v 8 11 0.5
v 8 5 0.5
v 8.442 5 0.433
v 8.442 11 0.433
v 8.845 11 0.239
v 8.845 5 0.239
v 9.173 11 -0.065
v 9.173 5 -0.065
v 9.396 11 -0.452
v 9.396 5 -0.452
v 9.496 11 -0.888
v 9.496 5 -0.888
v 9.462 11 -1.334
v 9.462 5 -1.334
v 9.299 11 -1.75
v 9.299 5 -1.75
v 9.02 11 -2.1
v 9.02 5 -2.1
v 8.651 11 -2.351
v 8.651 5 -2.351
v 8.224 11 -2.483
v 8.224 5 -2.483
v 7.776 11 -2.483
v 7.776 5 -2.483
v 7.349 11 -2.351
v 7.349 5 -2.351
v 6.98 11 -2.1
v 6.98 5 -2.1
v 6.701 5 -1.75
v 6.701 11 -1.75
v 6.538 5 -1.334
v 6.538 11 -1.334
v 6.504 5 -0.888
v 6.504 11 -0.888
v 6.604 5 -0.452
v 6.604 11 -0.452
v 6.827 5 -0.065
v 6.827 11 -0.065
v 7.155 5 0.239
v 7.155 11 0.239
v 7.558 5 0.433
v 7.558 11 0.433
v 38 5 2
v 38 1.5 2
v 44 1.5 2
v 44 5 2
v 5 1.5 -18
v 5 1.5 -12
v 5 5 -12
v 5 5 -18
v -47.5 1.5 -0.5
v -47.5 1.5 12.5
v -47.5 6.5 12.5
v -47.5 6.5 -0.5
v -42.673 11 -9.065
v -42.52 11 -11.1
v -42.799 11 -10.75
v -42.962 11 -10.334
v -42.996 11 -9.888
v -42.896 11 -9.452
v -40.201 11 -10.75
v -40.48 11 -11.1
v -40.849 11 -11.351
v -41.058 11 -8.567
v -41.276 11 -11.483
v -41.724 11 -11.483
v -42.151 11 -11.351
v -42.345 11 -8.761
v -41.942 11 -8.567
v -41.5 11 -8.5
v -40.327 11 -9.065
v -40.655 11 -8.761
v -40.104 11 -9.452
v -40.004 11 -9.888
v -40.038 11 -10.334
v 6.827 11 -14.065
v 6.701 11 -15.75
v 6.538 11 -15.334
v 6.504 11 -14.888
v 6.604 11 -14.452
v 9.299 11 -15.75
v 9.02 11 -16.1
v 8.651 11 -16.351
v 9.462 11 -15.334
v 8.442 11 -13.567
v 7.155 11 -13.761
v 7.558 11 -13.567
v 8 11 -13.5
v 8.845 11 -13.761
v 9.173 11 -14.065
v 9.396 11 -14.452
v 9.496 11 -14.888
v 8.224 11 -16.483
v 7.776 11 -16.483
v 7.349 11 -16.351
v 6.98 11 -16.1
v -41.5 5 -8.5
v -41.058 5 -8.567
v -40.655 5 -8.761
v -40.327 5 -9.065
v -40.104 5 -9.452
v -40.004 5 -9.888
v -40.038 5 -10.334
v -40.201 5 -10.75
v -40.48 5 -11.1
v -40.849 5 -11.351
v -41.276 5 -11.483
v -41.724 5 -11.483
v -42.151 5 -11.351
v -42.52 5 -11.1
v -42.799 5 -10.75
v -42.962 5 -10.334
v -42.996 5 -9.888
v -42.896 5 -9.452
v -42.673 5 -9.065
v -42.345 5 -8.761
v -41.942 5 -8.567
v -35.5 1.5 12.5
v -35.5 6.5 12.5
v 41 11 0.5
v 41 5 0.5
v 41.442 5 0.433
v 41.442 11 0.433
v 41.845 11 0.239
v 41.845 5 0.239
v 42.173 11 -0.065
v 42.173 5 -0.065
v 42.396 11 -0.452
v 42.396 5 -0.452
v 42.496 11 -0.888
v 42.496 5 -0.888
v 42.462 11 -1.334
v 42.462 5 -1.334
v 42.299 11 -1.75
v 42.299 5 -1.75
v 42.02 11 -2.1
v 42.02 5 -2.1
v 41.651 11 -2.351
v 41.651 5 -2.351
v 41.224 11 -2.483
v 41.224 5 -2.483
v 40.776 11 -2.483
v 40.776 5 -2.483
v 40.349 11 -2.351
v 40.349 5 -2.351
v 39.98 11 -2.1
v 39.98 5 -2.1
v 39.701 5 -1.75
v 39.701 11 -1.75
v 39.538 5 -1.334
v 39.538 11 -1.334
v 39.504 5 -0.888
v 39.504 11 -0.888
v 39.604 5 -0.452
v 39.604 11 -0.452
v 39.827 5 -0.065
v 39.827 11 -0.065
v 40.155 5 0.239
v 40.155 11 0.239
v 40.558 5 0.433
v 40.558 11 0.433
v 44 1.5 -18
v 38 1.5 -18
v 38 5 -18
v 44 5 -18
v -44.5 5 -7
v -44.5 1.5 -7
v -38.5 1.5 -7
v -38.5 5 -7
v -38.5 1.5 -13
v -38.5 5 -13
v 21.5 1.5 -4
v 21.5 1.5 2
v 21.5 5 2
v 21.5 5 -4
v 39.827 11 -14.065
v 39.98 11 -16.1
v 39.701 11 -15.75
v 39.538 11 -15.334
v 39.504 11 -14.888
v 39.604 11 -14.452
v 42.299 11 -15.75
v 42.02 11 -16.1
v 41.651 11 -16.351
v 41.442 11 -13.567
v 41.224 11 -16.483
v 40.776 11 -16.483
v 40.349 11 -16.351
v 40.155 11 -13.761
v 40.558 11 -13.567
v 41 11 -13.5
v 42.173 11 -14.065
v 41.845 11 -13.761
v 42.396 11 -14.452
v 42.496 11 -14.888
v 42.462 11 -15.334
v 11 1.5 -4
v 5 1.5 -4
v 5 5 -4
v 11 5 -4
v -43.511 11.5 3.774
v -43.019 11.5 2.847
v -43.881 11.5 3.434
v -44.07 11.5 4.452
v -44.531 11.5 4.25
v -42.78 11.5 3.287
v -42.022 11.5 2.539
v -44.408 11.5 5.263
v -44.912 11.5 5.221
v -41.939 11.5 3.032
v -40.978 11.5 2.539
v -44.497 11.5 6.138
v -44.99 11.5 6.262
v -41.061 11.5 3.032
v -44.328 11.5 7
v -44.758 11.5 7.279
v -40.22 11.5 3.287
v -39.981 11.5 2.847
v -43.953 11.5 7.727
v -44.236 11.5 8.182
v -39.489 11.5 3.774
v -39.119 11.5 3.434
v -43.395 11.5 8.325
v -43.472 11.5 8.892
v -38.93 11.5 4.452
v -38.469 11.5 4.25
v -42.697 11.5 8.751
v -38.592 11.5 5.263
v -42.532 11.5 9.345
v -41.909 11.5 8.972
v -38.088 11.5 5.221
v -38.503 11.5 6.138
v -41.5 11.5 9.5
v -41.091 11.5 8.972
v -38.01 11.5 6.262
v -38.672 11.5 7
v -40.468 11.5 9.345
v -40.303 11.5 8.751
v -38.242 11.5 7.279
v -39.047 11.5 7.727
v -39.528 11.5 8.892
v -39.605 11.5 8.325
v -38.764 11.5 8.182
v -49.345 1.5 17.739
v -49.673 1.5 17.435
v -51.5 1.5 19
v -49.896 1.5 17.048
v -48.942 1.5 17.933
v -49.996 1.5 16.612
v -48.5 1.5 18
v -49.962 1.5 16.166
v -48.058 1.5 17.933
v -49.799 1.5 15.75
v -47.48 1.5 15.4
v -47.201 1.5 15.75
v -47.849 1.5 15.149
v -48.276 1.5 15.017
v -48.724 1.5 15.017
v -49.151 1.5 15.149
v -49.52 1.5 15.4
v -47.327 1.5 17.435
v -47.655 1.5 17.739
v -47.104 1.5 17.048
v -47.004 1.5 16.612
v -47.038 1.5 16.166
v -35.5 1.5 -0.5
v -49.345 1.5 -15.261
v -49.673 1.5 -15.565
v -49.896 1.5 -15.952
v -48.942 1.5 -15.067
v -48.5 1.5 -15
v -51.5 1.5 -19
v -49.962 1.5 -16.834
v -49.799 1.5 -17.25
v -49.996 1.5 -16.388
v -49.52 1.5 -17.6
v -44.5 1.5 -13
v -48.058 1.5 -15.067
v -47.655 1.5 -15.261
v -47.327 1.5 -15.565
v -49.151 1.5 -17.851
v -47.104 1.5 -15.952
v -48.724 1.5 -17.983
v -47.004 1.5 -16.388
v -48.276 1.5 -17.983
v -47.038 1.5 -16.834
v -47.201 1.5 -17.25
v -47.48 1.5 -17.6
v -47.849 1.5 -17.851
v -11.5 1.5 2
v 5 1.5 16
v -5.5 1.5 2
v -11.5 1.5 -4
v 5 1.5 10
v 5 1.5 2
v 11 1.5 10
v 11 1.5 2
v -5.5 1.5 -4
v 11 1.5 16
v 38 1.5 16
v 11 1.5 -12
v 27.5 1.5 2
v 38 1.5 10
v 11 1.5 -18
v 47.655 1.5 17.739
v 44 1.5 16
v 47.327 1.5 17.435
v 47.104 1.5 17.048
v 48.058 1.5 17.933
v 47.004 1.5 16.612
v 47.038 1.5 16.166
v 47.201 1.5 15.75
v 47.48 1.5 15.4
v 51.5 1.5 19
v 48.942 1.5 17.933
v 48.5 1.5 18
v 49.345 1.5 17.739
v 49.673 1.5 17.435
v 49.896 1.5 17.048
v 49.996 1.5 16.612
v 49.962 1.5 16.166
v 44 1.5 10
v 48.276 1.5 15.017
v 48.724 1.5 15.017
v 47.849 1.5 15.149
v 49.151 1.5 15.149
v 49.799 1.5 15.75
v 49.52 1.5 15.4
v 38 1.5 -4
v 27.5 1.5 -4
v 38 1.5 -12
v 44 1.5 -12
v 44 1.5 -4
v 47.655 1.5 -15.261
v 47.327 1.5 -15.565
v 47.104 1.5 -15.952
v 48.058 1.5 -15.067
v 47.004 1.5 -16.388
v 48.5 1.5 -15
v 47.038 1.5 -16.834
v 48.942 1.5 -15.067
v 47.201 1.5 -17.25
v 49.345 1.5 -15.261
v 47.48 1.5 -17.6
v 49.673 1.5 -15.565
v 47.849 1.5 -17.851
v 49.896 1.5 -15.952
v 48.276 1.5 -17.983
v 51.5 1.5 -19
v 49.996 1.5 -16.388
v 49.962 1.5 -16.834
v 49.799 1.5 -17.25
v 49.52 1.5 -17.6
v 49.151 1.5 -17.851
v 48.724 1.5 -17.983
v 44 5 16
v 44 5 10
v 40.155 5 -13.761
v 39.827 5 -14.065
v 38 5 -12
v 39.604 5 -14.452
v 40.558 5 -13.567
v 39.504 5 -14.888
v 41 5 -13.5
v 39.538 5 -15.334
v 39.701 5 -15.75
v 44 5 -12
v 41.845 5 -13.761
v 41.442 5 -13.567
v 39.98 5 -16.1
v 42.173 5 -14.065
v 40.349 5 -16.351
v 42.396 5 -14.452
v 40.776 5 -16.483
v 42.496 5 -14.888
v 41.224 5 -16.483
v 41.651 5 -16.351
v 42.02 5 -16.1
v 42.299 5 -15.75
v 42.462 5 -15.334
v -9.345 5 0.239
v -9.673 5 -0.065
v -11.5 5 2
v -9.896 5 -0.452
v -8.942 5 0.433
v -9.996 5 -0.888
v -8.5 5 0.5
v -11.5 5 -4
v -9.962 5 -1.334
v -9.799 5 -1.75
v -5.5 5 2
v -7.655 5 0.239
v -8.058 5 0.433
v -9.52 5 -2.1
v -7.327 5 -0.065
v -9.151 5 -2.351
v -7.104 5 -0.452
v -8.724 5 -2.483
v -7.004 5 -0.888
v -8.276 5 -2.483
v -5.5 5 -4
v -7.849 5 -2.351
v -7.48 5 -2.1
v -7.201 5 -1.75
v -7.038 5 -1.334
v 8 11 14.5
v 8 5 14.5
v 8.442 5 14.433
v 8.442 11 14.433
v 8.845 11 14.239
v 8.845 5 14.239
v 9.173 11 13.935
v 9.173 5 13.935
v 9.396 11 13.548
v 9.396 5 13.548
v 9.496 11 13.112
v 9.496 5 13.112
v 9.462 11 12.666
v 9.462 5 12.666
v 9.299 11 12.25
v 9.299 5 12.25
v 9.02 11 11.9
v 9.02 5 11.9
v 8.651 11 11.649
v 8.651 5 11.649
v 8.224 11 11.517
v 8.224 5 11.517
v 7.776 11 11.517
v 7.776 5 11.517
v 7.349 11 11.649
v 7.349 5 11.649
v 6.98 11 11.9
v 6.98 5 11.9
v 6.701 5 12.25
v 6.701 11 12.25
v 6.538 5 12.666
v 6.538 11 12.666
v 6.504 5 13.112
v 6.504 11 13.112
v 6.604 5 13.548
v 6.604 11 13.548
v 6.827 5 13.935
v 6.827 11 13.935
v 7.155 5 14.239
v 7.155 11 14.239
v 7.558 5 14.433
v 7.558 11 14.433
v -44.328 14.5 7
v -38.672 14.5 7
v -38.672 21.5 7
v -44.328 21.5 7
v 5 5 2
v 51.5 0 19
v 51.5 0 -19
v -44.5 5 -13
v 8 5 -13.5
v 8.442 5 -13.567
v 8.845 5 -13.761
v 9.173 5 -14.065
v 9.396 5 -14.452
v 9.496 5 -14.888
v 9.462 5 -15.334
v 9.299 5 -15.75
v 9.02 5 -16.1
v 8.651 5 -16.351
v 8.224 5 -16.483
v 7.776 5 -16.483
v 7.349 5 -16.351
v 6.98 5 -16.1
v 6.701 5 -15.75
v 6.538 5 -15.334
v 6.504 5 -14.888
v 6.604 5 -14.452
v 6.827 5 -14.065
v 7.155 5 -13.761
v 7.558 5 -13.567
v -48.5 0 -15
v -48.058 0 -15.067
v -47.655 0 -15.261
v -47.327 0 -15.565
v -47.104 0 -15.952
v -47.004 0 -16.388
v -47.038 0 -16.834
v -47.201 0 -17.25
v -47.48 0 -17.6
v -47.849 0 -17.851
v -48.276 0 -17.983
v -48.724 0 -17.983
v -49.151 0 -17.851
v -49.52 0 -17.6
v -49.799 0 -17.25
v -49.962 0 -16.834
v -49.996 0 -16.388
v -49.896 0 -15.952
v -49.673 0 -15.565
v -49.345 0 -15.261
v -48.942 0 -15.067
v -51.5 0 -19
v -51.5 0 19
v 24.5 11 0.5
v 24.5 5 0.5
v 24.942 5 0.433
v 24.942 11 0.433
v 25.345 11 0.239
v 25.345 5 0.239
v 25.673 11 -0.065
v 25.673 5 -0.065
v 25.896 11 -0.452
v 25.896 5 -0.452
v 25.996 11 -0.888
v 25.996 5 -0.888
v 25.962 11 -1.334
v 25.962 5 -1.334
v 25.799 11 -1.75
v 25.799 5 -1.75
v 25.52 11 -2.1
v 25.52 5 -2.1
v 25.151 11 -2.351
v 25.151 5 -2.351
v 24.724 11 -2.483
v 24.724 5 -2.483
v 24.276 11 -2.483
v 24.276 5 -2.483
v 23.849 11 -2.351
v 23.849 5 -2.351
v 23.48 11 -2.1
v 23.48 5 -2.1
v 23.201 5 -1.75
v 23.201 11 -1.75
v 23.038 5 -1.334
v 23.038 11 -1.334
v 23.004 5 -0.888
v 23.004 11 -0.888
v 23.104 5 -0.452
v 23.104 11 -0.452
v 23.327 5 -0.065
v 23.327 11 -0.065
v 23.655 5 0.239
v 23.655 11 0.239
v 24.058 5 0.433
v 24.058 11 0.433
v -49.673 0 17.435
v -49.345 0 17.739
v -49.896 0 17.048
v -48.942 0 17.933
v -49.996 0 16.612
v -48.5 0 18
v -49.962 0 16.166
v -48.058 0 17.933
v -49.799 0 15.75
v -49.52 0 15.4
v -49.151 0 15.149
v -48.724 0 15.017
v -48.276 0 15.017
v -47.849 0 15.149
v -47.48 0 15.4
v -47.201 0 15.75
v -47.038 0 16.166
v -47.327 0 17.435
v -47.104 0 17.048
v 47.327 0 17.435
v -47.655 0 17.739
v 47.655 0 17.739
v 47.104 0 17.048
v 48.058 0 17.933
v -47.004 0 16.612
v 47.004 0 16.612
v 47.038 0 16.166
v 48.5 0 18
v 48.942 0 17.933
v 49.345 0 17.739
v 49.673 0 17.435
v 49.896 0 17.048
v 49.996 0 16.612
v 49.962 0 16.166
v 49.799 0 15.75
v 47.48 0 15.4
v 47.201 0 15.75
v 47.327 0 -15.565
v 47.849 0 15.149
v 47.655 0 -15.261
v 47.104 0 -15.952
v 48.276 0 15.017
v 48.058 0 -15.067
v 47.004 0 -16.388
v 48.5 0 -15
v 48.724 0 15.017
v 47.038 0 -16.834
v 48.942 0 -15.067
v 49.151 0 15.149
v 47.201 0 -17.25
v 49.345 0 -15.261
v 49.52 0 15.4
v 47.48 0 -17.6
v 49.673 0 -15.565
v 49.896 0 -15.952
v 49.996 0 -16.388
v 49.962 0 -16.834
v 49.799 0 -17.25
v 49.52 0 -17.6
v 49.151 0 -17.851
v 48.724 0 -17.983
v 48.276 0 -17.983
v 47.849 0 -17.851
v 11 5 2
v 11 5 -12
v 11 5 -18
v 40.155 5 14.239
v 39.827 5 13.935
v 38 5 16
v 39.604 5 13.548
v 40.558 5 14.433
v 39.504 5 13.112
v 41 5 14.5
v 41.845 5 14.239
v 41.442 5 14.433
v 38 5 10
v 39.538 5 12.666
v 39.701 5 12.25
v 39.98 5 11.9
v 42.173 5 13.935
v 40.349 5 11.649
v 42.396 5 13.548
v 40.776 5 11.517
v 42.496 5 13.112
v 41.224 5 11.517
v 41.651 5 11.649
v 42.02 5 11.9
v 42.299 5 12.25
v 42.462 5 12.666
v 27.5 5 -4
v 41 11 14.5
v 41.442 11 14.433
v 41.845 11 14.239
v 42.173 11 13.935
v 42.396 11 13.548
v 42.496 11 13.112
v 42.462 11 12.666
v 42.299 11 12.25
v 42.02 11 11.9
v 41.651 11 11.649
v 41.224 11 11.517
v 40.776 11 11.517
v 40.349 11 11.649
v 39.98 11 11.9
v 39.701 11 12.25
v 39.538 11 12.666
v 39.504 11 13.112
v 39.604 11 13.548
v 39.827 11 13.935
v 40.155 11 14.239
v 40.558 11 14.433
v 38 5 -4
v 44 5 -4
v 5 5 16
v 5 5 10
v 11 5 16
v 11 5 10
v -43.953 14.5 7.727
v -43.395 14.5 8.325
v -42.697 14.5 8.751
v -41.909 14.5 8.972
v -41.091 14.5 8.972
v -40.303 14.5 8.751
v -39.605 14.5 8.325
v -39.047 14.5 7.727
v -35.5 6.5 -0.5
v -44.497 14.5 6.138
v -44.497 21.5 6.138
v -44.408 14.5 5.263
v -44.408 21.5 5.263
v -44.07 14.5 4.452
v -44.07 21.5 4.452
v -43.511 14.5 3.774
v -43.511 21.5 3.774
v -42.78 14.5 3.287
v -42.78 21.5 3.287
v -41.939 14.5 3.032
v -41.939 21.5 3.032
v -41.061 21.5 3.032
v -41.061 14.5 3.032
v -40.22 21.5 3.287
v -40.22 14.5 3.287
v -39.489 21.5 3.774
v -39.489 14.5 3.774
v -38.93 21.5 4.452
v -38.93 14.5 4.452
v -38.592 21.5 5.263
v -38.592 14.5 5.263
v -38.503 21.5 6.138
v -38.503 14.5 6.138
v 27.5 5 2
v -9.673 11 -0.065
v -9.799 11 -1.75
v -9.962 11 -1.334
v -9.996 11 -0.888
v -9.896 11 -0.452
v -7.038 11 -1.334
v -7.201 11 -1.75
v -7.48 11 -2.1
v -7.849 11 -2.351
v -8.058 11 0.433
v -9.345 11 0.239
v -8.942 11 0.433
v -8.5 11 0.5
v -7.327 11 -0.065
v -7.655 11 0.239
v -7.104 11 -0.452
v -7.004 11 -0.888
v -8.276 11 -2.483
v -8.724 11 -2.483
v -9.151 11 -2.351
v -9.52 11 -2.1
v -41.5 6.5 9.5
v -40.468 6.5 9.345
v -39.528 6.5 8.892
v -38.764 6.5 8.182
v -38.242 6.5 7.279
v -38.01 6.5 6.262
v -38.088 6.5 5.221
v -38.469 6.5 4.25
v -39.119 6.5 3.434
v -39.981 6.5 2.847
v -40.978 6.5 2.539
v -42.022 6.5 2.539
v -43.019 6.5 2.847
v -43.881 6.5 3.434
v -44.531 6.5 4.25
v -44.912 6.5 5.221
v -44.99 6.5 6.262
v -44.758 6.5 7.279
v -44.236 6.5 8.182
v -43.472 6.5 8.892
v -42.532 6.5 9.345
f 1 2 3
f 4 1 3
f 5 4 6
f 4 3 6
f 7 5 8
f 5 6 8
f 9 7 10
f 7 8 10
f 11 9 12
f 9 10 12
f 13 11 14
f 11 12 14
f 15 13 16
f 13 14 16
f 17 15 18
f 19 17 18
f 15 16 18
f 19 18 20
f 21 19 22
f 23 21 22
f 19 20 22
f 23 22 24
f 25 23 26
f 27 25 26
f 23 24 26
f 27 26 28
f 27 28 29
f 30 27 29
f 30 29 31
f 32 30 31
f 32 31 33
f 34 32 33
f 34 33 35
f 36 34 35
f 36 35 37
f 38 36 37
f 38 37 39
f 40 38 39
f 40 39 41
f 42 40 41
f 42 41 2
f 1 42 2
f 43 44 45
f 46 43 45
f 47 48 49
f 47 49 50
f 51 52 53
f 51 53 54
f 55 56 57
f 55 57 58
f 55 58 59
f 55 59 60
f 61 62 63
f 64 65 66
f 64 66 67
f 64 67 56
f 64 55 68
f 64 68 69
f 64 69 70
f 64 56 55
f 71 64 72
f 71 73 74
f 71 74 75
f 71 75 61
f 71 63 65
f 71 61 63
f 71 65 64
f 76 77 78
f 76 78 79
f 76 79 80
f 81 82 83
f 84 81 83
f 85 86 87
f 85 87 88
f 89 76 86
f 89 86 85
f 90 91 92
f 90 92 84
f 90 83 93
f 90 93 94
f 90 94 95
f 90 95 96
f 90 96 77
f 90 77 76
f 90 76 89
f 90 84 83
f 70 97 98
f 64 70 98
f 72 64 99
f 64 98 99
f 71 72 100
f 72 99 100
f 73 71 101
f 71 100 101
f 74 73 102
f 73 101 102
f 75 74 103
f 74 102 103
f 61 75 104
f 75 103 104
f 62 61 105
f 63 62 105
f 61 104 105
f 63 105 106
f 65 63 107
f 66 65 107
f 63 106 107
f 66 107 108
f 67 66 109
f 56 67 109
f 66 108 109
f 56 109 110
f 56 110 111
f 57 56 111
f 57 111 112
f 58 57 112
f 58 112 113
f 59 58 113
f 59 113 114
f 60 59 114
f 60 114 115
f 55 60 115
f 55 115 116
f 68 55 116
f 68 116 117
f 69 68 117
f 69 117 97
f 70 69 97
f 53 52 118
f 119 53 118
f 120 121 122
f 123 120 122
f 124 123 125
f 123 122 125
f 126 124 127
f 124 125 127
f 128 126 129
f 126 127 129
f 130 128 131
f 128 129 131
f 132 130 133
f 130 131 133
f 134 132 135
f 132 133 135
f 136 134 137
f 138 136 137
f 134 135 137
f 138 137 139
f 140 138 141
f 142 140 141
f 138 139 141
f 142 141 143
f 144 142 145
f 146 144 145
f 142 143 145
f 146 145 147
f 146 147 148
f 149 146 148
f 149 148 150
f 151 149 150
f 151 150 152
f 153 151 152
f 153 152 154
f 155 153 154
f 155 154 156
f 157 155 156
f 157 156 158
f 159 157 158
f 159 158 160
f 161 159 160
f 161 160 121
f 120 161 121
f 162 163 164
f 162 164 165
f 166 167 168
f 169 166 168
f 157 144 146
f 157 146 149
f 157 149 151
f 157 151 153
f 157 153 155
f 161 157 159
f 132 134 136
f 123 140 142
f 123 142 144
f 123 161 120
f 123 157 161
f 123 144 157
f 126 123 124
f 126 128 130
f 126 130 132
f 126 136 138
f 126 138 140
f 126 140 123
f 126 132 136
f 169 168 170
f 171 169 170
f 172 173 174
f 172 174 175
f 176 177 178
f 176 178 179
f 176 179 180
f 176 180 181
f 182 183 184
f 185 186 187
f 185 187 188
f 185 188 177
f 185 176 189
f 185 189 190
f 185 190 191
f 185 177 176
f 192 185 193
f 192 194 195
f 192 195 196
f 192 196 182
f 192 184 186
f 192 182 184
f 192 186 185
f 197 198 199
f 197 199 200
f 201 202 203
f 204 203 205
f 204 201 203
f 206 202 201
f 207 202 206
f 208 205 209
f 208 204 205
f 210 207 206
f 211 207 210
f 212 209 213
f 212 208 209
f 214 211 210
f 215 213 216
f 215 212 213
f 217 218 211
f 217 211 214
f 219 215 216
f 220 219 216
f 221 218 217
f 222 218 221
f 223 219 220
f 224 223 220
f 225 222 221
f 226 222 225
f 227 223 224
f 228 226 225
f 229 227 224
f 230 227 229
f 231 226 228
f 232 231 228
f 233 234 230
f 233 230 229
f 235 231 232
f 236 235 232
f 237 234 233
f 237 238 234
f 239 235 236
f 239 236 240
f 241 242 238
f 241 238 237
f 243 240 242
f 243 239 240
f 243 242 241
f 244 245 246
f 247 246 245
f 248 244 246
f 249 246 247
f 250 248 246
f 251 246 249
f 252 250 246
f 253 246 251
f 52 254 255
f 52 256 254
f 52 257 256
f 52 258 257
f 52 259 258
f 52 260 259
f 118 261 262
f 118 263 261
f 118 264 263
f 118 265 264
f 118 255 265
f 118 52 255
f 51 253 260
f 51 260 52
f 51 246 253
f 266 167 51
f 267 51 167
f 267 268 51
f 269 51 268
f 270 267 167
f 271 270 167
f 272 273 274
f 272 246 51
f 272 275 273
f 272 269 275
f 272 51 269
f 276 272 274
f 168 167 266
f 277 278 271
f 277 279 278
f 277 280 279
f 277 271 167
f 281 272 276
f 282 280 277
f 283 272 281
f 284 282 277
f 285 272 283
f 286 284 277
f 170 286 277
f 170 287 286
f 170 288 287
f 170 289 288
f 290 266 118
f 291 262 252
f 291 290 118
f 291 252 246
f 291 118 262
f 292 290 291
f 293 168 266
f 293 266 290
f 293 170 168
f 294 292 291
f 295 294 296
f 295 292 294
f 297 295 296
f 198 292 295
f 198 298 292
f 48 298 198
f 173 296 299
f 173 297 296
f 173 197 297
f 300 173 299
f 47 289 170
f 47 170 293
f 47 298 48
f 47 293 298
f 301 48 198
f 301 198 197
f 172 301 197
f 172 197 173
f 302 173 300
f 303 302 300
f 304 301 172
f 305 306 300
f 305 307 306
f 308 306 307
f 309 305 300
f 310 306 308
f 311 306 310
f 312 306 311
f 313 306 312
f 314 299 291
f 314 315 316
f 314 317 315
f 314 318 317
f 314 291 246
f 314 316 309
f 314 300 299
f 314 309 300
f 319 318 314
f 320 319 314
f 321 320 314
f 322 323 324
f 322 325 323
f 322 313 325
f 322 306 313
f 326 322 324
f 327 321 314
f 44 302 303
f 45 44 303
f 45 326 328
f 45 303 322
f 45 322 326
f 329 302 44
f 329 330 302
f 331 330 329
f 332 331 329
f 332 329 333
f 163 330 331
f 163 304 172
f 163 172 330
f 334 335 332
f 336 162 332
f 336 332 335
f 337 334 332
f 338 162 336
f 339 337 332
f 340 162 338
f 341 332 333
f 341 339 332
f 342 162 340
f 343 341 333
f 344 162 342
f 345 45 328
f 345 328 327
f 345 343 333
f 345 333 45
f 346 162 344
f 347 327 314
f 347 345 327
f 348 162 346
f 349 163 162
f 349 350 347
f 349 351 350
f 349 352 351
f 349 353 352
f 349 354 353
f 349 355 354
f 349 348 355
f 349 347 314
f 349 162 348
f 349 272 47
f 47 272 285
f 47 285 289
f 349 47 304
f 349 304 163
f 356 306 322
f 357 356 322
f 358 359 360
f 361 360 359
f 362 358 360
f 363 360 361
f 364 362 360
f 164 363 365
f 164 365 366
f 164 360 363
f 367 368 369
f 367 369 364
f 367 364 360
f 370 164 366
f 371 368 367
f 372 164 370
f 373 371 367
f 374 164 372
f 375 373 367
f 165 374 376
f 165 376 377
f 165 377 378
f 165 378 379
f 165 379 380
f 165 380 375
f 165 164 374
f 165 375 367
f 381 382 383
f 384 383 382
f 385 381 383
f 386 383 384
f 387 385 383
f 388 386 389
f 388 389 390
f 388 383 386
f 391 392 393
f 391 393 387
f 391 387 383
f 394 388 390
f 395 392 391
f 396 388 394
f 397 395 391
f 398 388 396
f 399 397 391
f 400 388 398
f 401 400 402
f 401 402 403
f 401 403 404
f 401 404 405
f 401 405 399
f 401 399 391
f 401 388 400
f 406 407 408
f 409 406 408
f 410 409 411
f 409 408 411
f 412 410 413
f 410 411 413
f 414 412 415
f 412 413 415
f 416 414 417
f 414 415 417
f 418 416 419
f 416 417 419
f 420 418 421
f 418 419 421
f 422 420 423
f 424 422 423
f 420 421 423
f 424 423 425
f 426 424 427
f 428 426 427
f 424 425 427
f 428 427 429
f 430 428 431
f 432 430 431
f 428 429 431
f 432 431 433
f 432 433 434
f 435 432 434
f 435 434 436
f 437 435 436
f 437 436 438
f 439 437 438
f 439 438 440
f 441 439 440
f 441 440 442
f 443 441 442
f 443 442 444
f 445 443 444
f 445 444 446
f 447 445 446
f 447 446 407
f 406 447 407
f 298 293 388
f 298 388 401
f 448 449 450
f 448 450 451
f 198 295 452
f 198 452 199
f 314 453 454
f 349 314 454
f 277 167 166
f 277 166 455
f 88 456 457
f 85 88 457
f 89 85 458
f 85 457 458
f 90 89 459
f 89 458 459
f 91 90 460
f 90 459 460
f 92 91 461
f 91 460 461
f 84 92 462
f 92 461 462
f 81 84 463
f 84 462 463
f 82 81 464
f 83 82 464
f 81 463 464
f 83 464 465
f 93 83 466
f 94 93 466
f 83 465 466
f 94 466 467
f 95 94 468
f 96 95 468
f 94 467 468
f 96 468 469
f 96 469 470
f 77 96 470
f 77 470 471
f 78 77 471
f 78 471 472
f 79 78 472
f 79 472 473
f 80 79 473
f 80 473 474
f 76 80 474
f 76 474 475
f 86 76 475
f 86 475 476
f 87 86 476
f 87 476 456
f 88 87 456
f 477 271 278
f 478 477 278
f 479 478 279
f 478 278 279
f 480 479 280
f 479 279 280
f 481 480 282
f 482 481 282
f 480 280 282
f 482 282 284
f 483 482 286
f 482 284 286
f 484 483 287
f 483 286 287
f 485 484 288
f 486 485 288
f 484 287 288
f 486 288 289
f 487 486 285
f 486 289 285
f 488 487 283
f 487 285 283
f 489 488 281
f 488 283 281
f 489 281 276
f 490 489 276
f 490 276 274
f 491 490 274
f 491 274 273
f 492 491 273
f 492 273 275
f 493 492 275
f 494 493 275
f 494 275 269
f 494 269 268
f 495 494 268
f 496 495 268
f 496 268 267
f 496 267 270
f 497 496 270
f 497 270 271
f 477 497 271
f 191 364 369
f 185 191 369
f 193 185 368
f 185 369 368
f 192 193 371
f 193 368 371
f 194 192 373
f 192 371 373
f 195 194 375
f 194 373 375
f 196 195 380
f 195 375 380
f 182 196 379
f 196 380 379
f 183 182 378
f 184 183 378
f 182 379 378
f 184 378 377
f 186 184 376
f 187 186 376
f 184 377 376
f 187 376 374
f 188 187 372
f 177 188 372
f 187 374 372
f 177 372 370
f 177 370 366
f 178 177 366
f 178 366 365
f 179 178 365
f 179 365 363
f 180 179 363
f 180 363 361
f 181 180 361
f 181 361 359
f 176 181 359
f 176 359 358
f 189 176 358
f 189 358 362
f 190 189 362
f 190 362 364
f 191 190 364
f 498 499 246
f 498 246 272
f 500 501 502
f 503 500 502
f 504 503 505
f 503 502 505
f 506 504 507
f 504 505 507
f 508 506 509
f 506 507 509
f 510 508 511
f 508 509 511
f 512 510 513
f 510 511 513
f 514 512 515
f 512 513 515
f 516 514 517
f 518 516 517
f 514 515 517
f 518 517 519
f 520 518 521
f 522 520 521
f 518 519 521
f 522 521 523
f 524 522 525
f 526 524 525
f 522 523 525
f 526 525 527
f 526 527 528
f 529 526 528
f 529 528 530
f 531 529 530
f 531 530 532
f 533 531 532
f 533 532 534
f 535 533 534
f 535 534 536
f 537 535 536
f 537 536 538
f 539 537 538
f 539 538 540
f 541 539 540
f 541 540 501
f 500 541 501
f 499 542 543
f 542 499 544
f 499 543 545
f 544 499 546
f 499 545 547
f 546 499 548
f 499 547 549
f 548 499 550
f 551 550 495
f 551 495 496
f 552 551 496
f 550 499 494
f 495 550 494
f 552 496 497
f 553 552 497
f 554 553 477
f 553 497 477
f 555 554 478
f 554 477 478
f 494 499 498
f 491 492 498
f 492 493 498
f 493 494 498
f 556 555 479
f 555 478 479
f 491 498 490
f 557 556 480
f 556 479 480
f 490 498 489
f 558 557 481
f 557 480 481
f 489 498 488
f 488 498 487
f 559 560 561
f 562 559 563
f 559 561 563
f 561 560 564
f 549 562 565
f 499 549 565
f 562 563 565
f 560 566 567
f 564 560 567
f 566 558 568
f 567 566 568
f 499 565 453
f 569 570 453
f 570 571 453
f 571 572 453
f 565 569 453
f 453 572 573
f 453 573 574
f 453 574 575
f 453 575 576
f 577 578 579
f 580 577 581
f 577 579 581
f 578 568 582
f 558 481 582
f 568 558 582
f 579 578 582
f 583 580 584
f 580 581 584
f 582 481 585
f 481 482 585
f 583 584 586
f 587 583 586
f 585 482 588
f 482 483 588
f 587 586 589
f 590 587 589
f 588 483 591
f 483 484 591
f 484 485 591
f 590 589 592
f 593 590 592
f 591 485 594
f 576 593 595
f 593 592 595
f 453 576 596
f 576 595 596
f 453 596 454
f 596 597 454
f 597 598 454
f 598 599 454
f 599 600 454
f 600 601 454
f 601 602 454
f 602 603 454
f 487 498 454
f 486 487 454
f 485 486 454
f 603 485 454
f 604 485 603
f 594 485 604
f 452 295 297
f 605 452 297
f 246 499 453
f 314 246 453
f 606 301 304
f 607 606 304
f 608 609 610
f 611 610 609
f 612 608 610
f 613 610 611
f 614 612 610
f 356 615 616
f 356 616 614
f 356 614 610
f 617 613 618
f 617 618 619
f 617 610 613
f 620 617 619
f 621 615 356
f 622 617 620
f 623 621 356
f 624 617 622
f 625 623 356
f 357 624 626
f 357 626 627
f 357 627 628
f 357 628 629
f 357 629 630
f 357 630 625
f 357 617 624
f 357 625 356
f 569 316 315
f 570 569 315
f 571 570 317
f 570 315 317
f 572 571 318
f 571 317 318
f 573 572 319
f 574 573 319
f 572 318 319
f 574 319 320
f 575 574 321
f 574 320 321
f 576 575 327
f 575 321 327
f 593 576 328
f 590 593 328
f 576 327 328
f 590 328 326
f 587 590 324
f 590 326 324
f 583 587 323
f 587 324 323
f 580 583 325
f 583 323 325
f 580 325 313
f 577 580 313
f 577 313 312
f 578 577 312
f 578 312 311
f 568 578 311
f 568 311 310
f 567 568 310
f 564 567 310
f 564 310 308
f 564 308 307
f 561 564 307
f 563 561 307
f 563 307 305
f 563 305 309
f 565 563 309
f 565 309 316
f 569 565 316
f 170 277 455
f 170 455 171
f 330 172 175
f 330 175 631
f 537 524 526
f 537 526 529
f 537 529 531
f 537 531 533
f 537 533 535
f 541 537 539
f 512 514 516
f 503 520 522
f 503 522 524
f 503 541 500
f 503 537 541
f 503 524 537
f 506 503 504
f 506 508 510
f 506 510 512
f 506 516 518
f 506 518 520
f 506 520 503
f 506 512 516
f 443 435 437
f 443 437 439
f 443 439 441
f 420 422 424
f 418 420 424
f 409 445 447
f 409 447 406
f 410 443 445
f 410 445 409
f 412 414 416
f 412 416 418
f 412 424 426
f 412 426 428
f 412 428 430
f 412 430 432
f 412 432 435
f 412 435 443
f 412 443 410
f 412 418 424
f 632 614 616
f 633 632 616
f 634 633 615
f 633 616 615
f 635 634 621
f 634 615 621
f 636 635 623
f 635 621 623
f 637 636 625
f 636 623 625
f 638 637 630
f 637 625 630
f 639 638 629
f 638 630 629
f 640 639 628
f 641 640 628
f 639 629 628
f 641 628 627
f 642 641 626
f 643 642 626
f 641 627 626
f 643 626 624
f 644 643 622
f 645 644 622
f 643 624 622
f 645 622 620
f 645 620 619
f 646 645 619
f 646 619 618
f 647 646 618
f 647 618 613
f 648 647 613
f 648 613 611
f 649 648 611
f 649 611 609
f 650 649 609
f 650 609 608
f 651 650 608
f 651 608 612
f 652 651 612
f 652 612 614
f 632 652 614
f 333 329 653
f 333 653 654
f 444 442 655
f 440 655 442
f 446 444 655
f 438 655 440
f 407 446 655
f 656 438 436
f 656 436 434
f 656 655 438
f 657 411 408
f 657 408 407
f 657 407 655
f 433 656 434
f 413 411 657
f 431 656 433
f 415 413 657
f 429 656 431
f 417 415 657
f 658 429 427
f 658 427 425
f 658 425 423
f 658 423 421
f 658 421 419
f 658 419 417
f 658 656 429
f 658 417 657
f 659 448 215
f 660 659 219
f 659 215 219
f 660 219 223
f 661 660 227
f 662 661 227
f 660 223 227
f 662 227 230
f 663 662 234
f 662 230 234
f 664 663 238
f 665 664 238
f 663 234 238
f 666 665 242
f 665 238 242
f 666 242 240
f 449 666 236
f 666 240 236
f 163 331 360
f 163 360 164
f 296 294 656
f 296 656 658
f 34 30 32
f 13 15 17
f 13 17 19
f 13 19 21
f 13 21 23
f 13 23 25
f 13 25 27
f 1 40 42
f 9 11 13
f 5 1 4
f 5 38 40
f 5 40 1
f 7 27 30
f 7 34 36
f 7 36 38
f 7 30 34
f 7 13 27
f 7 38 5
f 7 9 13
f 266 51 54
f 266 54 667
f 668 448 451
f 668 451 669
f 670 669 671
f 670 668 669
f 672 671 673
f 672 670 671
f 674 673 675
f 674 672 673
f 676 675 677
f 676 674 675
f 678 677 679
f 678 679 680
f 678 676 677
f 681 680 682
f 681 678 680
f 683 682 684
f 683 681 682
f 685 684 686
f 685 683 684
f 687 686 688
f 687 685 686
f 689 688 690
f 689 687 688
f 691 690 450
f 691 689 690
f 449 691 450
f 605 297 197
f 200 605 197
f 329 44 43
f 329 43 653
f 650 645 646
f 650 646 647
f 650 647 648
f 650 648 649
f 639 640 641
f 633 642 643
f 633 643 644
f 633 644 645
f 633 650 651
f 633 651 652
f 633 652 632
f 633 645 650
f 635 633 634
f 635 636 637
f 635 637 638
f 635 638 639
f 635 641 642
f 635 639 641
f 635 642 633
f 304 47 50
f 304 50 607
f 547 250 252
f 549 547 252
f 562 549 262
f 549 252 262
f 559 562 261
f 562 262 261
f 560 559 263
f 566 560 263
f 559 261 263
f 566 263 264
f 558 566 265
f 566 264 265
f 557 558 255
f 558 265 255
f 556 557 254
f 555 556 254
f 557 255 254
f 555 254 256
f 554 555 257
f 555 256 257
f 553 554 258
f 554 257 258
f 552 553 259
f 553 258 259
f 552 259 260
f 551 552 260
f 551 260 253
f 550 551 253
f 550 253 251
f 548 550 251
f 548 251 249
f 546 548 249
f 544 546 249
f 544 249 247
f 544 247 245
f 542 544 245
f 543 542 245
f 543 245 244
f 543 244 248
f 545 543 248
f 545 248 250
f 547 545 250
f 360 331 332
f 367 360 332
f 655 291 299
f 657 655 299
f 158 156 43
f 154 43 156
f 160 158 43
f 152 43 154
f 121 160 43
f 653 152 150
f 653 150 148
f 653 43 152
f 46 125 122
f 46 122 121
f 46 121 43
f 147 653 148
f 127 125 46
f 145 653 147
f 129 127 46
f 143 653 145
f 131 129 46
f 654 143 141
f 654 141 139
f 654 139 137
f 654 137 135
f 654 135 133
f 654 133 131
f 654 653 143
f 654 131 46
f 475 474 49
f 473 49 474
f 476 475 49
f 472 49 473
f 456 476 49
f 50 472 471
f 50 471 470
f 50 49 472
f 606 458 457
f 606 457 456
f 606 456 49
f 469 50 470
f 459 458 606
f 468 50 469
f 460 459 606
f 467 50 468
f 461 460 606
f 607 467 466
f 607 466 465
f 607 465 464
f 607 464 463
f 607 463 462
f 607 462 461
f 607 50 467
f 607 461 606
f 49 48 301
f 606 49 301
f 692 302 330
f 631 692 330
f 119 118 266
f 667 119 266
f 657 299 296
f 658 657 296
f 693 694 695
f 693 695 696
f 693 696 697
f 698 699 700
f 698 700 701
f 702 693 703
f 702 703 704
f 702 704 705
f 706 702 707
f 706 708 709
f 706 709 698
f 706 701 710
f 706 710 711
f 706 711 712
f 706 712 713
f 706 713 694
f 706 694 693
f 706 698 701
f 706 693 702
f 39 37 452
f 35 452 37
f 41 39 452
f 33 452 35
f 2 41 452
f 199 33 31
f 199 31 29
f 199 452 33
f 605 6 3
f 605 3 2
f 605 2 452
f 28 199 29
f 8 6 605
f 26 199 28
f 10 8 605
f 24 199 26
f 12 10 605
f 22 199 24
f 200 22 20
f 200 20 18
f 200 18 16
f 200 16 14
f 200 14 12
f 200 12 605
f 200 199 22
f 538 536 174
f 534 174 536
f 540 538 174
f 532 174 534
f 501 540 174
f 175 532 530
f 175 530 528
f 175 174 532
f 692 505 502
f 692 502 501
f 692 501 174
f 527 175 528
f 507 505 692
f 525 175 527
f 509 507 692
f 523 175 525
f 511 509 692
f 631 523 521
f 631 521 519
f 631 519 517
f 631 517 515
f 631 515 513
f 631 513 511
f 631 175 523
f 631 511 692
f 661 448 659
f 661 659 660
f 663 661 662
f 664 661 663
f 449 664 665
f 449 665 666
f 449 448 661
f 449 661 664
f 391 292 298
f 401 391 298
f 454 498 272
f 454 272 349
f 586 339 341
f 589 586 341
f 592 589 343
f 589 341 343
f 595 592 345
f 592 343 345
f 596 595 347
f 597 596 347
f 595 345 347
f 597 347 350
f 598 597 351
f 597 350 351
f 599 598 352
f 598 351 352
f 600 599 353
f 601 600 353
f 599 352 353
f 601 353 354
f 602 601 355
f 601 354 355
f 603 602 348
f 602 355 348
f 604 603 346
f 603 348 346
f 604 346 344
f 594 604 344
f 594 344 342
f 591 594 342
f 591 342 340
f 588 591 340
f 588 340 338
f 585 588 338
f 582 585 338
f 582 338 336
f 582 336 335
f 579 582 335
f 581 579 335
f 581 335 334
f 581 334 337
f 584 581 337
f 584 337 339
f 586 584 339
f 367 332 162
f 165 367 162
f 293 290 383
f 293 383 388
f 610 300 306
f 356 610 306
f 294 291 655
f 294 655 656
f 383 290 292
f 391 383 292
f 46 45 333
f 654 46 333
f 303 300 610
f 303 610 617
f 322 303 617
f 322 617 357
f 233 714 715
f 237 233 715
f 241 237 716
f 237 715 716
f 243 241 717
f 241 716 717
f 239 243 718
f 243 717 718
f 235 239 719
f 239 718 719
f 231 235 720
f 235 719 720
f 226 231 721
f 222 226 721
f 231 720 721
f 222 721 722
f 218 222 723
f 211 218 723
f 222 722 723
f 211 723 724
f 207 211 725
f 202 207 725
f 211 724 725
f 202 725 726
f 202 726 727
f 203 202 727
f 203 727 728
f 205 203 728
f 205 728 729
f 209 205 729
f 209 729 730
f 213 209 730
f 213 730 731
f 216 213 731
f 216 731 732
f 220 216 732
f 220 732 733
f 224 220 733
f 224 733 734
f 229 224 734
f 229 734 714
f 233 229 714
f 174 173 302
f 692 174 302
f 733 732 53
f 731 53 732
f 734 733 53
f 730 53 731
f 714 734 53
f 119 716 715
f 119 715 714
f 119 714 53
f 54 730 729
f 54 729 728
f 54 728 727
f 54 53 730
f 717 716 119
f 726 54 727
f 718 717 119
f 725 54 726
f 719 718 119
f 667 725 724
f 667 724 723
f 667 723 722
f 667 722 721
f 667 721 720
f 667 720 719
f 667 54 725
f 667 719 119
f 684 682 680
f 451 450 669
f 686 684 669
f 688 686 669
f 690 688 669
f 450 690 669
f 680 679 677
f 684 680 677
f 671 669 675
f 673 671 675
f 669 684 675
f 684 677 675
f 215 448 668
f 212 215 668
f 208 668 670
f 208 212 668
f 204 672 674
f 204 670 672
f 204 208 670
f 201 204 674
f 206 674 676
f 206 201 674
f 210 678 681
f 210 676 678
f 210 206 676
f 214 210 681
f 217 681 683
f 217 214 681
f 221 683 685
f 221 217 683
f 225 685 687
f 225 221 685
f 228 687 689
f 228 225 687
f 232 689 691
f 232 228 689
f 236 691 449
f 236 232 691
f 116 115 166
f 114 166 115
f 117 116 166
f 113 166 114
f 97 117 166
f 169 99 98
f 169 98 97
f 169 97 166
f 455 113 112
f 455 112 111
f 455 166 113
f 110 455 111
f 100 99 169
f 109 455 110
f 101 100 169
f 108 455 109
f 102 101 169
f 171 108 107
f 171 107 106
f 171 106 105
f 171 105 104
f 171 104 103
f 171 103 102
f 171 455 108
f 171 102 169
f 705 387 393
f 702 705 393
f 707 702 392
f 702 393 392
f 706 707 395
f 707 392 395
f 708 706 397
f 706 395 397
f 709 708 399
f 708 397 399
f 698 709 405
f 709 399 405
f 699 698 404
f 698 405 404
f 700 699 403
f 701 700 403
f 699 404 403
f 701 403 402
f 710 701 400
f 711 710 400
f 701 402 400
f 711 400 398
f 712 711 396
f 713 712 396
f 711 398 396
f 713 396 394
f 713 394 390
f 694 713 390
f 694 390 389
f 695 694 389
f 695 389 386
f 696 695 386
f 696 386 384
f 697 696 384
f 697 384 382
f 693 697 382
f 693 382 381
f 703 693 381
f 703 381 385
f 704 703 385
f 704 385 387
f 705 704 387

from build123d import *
from build123d.topology import SkipClean

# Parameters (mm, degrees)
SKETCH1_W           = 103
SKETCH1_H           = 38
BOSS_EXTRUDE1_DEPTH = 1.5
SKETCH2_R           = 1.5
CUT_EXTRUDE1_DEPTH  = 55.913568451
SKETCH3_R           = 1.5
BOSS_EXTRUDE2_DEPTH = 9.5
SKETCH5_W           = 6
SKETCH5_H           = 6
BOSS_EXTRUDE3_DEPTH = 3.5
BOSS_EXTRUDE4_DEPTH = 20
SKETCH7_R           = 3
BOSS_EXTRUDE5_DEPTH = 13
SKETCH8_R           = 3.5
BOSS_EXTRUDE6_DEPTH = 10
SKETCH9_W           = 12
SKETCH9_H           = 13
BOSS_EXTRUDE7_DEPTH = 5


with BuildPart() as part:
    # Sketch1 → Boss-Extrude1 (new body)
    with BuildSketch(Plane(origin=(0, 0, 0), x_dir=(1, 0, 0), z_dir=(0, 1, 0))):
        Rectangle(SKETCH1_W, SKETCH1_H)
    extrude(amount=BOSS_EXTRUDE1_DEPTH)

    # Sketch2 → Cut-Extrude1 (cut, through all)
    with BuildSketch(Plane(origin=(0, 1.5, 0), x_dir=(1, 0, 0), z_dir=(0, 1, 0))):
        with Locations(Location((-48.5, 16.5, 0), (0, 0, 270))):
            Circle(SKETCH2_R)
        with Locations(Location((-48.5, -16.5, 0), (0, 0, 270))):
            Circle(SKETCH2_R)
        with Locations(Location((48.5, -16.5, 0), (0, 0, 270))):
            Circle(SKETCH2_R)
        with Locations(Location((48.5, 16.5, 0), (0, 0, 270))):
            Circle(SKETCH2_R)
    extrude(amount=-CUT_EXTRUDE1_DEPTH, mode=Mode.SUBTRACT)

    # Sketch3 → Boss-Extrude2 (add)
    with BuildSketch(Plane(origin=(0, 1.5, 0), x_dir=(1, 0, 0), z_dir=(0, 1, 0))):
        with Locations(Location((41, 15, 0), (0, 0, 270))):
            Circle(SKETCH3_R)
        with Locations(Location((41, 1, 0), (0, 0, 270))):
            Circle(SKETCH3_R)
        with Locations(Location((41, -13, 0), (0, 0, 270))):
            Circle(SKETCH3_R)
        with Locations(Location((24.5, 1, 0), (0, 0, 270))):
            Circle(SKETCH3_R)
        with Locations(Location((8, 1, 0), (0, 0, 270))):
            Circle(SKETCH3_R)
        with Locations(Location((8, 15, 0), (0, 0, 270))):
            Circle(SKETCH3_R)
        with Locations(Location((8, -13, 0), (0, 0, 270))):
            Circle(SKETCH3_R)
        with Locations(Location((-8.5, 1, 0), (0, 0, 270))):
            Circle(SKETCH3_R)
        with Locations(Location((-41.5, 10, 0), (0, 0, 270))):
            Circle(SKETCH3_R)
    extrude(amount=BOSS_EXTRUDE2_DEPTH)

    # Sketch5 → Boss-Extrude3 (add)
    with BuildSketch(Plane(origin=(0, 1.5, 0), x_dir=(1, 0, 0), z_dir=(0, 1, 0))):
        with Locations((8, 15)):
            Rectangle(SKETCH5_W, SKETCH5_H)
        with Locations((24.5, 1)):
            Rectangle(SKETCH5_W, SKETCH5_H)
        with Locations((8, 1)):
            Rectangle(SKETCH5_W, SKETCH5_H)
        with Locations((-8.5, 1)):
            Rectangle(SKETCH5_W, SKETCH5_H)
        with Locations((8, -13)):
            Rectangle(SKETCH5_W, SKETCH5_H)
        with Locations((41, -13)):
            Rectangle(SKETCH5_W, SKETCH5_H)
        with Locations((41, 1)):
            Rectangle(SKETCH5_W, SKETCH5_H)
        with Locations((41, 15)):
            Rectangle(SKETCH5_W, SKETCH5_H)
        with Locations((-41.5, 10)):
            Rectangle(SKETCH5_W, SKETCH5_H)
    extrude(amount=BOSS_EXTRUDE3_DEPTH)

    # Sketch6 → Boss-Extrude4 (add)
    with BuildSketch(Plane(origin=(0, 1.5, 0), x_dir=(1, 0, 0), z_dir=(0, 1, 0))):
        with BuildLine():
            Line((-38.671572875, -7), (-44.328427125, -7))
            ThreePointArc((-44.328427125, -7), (-41.5, -3), (-38.671572875, -7))
        make_face()
    extrude(amount=BOSS_EXTRUDE4_DEPTH)

    # Sketch7 → Boss-Extrude5 (add)
    with SkipClean():  # the faces are left unmerged after this step: merging them gives an invalid solid
        with BuildSketch(Plane(origin=(0, 1.5, 0), x_dir=(1, 0, 0), z_dir=(0, 1, 0))):
            with Locations(Location((-41.5, -6, 0), (0, 0, 340.528779366))):
                Circle(SKETCH7_R)
        extrude(amount=BOSS_EXTRUDE5_DEPTH)

    # Sketch8 → Boss-Extrude6 (add)
    with SkipClean():  # the faces are left unmerged after this step: merging them gives an invalid solid
        with BuildSketch(Plane(origin=(0, 1.5, 0), x_dir=(1, 0, 0), z_dir=(0, 1, 0))):
            with Locations(Location((-41.5, -6, 0), (0, 0, 270))):
                Circle(SKETCH8_R)
        extrude(amount=BOSS_EXTRUDE6_DEPTH)

    # Sketch9 → Boss-Extrude7 (add)
    with SkipClean():  # the faces are left unmerged after this step: merging them gives an invalid solid
        with BuildSketch(Plane(origin=(0, 1.5, 0), x_dir=(1, 0, 0), z_dir=(0, 1, 0))):
            with Locations((-41.5, -6)):
                Rectangle(SKETCH9_W, SKETCH9_H)
        extrude(amount=BOSS_EXTRUDE7_DEPTH)


solid = part.part
